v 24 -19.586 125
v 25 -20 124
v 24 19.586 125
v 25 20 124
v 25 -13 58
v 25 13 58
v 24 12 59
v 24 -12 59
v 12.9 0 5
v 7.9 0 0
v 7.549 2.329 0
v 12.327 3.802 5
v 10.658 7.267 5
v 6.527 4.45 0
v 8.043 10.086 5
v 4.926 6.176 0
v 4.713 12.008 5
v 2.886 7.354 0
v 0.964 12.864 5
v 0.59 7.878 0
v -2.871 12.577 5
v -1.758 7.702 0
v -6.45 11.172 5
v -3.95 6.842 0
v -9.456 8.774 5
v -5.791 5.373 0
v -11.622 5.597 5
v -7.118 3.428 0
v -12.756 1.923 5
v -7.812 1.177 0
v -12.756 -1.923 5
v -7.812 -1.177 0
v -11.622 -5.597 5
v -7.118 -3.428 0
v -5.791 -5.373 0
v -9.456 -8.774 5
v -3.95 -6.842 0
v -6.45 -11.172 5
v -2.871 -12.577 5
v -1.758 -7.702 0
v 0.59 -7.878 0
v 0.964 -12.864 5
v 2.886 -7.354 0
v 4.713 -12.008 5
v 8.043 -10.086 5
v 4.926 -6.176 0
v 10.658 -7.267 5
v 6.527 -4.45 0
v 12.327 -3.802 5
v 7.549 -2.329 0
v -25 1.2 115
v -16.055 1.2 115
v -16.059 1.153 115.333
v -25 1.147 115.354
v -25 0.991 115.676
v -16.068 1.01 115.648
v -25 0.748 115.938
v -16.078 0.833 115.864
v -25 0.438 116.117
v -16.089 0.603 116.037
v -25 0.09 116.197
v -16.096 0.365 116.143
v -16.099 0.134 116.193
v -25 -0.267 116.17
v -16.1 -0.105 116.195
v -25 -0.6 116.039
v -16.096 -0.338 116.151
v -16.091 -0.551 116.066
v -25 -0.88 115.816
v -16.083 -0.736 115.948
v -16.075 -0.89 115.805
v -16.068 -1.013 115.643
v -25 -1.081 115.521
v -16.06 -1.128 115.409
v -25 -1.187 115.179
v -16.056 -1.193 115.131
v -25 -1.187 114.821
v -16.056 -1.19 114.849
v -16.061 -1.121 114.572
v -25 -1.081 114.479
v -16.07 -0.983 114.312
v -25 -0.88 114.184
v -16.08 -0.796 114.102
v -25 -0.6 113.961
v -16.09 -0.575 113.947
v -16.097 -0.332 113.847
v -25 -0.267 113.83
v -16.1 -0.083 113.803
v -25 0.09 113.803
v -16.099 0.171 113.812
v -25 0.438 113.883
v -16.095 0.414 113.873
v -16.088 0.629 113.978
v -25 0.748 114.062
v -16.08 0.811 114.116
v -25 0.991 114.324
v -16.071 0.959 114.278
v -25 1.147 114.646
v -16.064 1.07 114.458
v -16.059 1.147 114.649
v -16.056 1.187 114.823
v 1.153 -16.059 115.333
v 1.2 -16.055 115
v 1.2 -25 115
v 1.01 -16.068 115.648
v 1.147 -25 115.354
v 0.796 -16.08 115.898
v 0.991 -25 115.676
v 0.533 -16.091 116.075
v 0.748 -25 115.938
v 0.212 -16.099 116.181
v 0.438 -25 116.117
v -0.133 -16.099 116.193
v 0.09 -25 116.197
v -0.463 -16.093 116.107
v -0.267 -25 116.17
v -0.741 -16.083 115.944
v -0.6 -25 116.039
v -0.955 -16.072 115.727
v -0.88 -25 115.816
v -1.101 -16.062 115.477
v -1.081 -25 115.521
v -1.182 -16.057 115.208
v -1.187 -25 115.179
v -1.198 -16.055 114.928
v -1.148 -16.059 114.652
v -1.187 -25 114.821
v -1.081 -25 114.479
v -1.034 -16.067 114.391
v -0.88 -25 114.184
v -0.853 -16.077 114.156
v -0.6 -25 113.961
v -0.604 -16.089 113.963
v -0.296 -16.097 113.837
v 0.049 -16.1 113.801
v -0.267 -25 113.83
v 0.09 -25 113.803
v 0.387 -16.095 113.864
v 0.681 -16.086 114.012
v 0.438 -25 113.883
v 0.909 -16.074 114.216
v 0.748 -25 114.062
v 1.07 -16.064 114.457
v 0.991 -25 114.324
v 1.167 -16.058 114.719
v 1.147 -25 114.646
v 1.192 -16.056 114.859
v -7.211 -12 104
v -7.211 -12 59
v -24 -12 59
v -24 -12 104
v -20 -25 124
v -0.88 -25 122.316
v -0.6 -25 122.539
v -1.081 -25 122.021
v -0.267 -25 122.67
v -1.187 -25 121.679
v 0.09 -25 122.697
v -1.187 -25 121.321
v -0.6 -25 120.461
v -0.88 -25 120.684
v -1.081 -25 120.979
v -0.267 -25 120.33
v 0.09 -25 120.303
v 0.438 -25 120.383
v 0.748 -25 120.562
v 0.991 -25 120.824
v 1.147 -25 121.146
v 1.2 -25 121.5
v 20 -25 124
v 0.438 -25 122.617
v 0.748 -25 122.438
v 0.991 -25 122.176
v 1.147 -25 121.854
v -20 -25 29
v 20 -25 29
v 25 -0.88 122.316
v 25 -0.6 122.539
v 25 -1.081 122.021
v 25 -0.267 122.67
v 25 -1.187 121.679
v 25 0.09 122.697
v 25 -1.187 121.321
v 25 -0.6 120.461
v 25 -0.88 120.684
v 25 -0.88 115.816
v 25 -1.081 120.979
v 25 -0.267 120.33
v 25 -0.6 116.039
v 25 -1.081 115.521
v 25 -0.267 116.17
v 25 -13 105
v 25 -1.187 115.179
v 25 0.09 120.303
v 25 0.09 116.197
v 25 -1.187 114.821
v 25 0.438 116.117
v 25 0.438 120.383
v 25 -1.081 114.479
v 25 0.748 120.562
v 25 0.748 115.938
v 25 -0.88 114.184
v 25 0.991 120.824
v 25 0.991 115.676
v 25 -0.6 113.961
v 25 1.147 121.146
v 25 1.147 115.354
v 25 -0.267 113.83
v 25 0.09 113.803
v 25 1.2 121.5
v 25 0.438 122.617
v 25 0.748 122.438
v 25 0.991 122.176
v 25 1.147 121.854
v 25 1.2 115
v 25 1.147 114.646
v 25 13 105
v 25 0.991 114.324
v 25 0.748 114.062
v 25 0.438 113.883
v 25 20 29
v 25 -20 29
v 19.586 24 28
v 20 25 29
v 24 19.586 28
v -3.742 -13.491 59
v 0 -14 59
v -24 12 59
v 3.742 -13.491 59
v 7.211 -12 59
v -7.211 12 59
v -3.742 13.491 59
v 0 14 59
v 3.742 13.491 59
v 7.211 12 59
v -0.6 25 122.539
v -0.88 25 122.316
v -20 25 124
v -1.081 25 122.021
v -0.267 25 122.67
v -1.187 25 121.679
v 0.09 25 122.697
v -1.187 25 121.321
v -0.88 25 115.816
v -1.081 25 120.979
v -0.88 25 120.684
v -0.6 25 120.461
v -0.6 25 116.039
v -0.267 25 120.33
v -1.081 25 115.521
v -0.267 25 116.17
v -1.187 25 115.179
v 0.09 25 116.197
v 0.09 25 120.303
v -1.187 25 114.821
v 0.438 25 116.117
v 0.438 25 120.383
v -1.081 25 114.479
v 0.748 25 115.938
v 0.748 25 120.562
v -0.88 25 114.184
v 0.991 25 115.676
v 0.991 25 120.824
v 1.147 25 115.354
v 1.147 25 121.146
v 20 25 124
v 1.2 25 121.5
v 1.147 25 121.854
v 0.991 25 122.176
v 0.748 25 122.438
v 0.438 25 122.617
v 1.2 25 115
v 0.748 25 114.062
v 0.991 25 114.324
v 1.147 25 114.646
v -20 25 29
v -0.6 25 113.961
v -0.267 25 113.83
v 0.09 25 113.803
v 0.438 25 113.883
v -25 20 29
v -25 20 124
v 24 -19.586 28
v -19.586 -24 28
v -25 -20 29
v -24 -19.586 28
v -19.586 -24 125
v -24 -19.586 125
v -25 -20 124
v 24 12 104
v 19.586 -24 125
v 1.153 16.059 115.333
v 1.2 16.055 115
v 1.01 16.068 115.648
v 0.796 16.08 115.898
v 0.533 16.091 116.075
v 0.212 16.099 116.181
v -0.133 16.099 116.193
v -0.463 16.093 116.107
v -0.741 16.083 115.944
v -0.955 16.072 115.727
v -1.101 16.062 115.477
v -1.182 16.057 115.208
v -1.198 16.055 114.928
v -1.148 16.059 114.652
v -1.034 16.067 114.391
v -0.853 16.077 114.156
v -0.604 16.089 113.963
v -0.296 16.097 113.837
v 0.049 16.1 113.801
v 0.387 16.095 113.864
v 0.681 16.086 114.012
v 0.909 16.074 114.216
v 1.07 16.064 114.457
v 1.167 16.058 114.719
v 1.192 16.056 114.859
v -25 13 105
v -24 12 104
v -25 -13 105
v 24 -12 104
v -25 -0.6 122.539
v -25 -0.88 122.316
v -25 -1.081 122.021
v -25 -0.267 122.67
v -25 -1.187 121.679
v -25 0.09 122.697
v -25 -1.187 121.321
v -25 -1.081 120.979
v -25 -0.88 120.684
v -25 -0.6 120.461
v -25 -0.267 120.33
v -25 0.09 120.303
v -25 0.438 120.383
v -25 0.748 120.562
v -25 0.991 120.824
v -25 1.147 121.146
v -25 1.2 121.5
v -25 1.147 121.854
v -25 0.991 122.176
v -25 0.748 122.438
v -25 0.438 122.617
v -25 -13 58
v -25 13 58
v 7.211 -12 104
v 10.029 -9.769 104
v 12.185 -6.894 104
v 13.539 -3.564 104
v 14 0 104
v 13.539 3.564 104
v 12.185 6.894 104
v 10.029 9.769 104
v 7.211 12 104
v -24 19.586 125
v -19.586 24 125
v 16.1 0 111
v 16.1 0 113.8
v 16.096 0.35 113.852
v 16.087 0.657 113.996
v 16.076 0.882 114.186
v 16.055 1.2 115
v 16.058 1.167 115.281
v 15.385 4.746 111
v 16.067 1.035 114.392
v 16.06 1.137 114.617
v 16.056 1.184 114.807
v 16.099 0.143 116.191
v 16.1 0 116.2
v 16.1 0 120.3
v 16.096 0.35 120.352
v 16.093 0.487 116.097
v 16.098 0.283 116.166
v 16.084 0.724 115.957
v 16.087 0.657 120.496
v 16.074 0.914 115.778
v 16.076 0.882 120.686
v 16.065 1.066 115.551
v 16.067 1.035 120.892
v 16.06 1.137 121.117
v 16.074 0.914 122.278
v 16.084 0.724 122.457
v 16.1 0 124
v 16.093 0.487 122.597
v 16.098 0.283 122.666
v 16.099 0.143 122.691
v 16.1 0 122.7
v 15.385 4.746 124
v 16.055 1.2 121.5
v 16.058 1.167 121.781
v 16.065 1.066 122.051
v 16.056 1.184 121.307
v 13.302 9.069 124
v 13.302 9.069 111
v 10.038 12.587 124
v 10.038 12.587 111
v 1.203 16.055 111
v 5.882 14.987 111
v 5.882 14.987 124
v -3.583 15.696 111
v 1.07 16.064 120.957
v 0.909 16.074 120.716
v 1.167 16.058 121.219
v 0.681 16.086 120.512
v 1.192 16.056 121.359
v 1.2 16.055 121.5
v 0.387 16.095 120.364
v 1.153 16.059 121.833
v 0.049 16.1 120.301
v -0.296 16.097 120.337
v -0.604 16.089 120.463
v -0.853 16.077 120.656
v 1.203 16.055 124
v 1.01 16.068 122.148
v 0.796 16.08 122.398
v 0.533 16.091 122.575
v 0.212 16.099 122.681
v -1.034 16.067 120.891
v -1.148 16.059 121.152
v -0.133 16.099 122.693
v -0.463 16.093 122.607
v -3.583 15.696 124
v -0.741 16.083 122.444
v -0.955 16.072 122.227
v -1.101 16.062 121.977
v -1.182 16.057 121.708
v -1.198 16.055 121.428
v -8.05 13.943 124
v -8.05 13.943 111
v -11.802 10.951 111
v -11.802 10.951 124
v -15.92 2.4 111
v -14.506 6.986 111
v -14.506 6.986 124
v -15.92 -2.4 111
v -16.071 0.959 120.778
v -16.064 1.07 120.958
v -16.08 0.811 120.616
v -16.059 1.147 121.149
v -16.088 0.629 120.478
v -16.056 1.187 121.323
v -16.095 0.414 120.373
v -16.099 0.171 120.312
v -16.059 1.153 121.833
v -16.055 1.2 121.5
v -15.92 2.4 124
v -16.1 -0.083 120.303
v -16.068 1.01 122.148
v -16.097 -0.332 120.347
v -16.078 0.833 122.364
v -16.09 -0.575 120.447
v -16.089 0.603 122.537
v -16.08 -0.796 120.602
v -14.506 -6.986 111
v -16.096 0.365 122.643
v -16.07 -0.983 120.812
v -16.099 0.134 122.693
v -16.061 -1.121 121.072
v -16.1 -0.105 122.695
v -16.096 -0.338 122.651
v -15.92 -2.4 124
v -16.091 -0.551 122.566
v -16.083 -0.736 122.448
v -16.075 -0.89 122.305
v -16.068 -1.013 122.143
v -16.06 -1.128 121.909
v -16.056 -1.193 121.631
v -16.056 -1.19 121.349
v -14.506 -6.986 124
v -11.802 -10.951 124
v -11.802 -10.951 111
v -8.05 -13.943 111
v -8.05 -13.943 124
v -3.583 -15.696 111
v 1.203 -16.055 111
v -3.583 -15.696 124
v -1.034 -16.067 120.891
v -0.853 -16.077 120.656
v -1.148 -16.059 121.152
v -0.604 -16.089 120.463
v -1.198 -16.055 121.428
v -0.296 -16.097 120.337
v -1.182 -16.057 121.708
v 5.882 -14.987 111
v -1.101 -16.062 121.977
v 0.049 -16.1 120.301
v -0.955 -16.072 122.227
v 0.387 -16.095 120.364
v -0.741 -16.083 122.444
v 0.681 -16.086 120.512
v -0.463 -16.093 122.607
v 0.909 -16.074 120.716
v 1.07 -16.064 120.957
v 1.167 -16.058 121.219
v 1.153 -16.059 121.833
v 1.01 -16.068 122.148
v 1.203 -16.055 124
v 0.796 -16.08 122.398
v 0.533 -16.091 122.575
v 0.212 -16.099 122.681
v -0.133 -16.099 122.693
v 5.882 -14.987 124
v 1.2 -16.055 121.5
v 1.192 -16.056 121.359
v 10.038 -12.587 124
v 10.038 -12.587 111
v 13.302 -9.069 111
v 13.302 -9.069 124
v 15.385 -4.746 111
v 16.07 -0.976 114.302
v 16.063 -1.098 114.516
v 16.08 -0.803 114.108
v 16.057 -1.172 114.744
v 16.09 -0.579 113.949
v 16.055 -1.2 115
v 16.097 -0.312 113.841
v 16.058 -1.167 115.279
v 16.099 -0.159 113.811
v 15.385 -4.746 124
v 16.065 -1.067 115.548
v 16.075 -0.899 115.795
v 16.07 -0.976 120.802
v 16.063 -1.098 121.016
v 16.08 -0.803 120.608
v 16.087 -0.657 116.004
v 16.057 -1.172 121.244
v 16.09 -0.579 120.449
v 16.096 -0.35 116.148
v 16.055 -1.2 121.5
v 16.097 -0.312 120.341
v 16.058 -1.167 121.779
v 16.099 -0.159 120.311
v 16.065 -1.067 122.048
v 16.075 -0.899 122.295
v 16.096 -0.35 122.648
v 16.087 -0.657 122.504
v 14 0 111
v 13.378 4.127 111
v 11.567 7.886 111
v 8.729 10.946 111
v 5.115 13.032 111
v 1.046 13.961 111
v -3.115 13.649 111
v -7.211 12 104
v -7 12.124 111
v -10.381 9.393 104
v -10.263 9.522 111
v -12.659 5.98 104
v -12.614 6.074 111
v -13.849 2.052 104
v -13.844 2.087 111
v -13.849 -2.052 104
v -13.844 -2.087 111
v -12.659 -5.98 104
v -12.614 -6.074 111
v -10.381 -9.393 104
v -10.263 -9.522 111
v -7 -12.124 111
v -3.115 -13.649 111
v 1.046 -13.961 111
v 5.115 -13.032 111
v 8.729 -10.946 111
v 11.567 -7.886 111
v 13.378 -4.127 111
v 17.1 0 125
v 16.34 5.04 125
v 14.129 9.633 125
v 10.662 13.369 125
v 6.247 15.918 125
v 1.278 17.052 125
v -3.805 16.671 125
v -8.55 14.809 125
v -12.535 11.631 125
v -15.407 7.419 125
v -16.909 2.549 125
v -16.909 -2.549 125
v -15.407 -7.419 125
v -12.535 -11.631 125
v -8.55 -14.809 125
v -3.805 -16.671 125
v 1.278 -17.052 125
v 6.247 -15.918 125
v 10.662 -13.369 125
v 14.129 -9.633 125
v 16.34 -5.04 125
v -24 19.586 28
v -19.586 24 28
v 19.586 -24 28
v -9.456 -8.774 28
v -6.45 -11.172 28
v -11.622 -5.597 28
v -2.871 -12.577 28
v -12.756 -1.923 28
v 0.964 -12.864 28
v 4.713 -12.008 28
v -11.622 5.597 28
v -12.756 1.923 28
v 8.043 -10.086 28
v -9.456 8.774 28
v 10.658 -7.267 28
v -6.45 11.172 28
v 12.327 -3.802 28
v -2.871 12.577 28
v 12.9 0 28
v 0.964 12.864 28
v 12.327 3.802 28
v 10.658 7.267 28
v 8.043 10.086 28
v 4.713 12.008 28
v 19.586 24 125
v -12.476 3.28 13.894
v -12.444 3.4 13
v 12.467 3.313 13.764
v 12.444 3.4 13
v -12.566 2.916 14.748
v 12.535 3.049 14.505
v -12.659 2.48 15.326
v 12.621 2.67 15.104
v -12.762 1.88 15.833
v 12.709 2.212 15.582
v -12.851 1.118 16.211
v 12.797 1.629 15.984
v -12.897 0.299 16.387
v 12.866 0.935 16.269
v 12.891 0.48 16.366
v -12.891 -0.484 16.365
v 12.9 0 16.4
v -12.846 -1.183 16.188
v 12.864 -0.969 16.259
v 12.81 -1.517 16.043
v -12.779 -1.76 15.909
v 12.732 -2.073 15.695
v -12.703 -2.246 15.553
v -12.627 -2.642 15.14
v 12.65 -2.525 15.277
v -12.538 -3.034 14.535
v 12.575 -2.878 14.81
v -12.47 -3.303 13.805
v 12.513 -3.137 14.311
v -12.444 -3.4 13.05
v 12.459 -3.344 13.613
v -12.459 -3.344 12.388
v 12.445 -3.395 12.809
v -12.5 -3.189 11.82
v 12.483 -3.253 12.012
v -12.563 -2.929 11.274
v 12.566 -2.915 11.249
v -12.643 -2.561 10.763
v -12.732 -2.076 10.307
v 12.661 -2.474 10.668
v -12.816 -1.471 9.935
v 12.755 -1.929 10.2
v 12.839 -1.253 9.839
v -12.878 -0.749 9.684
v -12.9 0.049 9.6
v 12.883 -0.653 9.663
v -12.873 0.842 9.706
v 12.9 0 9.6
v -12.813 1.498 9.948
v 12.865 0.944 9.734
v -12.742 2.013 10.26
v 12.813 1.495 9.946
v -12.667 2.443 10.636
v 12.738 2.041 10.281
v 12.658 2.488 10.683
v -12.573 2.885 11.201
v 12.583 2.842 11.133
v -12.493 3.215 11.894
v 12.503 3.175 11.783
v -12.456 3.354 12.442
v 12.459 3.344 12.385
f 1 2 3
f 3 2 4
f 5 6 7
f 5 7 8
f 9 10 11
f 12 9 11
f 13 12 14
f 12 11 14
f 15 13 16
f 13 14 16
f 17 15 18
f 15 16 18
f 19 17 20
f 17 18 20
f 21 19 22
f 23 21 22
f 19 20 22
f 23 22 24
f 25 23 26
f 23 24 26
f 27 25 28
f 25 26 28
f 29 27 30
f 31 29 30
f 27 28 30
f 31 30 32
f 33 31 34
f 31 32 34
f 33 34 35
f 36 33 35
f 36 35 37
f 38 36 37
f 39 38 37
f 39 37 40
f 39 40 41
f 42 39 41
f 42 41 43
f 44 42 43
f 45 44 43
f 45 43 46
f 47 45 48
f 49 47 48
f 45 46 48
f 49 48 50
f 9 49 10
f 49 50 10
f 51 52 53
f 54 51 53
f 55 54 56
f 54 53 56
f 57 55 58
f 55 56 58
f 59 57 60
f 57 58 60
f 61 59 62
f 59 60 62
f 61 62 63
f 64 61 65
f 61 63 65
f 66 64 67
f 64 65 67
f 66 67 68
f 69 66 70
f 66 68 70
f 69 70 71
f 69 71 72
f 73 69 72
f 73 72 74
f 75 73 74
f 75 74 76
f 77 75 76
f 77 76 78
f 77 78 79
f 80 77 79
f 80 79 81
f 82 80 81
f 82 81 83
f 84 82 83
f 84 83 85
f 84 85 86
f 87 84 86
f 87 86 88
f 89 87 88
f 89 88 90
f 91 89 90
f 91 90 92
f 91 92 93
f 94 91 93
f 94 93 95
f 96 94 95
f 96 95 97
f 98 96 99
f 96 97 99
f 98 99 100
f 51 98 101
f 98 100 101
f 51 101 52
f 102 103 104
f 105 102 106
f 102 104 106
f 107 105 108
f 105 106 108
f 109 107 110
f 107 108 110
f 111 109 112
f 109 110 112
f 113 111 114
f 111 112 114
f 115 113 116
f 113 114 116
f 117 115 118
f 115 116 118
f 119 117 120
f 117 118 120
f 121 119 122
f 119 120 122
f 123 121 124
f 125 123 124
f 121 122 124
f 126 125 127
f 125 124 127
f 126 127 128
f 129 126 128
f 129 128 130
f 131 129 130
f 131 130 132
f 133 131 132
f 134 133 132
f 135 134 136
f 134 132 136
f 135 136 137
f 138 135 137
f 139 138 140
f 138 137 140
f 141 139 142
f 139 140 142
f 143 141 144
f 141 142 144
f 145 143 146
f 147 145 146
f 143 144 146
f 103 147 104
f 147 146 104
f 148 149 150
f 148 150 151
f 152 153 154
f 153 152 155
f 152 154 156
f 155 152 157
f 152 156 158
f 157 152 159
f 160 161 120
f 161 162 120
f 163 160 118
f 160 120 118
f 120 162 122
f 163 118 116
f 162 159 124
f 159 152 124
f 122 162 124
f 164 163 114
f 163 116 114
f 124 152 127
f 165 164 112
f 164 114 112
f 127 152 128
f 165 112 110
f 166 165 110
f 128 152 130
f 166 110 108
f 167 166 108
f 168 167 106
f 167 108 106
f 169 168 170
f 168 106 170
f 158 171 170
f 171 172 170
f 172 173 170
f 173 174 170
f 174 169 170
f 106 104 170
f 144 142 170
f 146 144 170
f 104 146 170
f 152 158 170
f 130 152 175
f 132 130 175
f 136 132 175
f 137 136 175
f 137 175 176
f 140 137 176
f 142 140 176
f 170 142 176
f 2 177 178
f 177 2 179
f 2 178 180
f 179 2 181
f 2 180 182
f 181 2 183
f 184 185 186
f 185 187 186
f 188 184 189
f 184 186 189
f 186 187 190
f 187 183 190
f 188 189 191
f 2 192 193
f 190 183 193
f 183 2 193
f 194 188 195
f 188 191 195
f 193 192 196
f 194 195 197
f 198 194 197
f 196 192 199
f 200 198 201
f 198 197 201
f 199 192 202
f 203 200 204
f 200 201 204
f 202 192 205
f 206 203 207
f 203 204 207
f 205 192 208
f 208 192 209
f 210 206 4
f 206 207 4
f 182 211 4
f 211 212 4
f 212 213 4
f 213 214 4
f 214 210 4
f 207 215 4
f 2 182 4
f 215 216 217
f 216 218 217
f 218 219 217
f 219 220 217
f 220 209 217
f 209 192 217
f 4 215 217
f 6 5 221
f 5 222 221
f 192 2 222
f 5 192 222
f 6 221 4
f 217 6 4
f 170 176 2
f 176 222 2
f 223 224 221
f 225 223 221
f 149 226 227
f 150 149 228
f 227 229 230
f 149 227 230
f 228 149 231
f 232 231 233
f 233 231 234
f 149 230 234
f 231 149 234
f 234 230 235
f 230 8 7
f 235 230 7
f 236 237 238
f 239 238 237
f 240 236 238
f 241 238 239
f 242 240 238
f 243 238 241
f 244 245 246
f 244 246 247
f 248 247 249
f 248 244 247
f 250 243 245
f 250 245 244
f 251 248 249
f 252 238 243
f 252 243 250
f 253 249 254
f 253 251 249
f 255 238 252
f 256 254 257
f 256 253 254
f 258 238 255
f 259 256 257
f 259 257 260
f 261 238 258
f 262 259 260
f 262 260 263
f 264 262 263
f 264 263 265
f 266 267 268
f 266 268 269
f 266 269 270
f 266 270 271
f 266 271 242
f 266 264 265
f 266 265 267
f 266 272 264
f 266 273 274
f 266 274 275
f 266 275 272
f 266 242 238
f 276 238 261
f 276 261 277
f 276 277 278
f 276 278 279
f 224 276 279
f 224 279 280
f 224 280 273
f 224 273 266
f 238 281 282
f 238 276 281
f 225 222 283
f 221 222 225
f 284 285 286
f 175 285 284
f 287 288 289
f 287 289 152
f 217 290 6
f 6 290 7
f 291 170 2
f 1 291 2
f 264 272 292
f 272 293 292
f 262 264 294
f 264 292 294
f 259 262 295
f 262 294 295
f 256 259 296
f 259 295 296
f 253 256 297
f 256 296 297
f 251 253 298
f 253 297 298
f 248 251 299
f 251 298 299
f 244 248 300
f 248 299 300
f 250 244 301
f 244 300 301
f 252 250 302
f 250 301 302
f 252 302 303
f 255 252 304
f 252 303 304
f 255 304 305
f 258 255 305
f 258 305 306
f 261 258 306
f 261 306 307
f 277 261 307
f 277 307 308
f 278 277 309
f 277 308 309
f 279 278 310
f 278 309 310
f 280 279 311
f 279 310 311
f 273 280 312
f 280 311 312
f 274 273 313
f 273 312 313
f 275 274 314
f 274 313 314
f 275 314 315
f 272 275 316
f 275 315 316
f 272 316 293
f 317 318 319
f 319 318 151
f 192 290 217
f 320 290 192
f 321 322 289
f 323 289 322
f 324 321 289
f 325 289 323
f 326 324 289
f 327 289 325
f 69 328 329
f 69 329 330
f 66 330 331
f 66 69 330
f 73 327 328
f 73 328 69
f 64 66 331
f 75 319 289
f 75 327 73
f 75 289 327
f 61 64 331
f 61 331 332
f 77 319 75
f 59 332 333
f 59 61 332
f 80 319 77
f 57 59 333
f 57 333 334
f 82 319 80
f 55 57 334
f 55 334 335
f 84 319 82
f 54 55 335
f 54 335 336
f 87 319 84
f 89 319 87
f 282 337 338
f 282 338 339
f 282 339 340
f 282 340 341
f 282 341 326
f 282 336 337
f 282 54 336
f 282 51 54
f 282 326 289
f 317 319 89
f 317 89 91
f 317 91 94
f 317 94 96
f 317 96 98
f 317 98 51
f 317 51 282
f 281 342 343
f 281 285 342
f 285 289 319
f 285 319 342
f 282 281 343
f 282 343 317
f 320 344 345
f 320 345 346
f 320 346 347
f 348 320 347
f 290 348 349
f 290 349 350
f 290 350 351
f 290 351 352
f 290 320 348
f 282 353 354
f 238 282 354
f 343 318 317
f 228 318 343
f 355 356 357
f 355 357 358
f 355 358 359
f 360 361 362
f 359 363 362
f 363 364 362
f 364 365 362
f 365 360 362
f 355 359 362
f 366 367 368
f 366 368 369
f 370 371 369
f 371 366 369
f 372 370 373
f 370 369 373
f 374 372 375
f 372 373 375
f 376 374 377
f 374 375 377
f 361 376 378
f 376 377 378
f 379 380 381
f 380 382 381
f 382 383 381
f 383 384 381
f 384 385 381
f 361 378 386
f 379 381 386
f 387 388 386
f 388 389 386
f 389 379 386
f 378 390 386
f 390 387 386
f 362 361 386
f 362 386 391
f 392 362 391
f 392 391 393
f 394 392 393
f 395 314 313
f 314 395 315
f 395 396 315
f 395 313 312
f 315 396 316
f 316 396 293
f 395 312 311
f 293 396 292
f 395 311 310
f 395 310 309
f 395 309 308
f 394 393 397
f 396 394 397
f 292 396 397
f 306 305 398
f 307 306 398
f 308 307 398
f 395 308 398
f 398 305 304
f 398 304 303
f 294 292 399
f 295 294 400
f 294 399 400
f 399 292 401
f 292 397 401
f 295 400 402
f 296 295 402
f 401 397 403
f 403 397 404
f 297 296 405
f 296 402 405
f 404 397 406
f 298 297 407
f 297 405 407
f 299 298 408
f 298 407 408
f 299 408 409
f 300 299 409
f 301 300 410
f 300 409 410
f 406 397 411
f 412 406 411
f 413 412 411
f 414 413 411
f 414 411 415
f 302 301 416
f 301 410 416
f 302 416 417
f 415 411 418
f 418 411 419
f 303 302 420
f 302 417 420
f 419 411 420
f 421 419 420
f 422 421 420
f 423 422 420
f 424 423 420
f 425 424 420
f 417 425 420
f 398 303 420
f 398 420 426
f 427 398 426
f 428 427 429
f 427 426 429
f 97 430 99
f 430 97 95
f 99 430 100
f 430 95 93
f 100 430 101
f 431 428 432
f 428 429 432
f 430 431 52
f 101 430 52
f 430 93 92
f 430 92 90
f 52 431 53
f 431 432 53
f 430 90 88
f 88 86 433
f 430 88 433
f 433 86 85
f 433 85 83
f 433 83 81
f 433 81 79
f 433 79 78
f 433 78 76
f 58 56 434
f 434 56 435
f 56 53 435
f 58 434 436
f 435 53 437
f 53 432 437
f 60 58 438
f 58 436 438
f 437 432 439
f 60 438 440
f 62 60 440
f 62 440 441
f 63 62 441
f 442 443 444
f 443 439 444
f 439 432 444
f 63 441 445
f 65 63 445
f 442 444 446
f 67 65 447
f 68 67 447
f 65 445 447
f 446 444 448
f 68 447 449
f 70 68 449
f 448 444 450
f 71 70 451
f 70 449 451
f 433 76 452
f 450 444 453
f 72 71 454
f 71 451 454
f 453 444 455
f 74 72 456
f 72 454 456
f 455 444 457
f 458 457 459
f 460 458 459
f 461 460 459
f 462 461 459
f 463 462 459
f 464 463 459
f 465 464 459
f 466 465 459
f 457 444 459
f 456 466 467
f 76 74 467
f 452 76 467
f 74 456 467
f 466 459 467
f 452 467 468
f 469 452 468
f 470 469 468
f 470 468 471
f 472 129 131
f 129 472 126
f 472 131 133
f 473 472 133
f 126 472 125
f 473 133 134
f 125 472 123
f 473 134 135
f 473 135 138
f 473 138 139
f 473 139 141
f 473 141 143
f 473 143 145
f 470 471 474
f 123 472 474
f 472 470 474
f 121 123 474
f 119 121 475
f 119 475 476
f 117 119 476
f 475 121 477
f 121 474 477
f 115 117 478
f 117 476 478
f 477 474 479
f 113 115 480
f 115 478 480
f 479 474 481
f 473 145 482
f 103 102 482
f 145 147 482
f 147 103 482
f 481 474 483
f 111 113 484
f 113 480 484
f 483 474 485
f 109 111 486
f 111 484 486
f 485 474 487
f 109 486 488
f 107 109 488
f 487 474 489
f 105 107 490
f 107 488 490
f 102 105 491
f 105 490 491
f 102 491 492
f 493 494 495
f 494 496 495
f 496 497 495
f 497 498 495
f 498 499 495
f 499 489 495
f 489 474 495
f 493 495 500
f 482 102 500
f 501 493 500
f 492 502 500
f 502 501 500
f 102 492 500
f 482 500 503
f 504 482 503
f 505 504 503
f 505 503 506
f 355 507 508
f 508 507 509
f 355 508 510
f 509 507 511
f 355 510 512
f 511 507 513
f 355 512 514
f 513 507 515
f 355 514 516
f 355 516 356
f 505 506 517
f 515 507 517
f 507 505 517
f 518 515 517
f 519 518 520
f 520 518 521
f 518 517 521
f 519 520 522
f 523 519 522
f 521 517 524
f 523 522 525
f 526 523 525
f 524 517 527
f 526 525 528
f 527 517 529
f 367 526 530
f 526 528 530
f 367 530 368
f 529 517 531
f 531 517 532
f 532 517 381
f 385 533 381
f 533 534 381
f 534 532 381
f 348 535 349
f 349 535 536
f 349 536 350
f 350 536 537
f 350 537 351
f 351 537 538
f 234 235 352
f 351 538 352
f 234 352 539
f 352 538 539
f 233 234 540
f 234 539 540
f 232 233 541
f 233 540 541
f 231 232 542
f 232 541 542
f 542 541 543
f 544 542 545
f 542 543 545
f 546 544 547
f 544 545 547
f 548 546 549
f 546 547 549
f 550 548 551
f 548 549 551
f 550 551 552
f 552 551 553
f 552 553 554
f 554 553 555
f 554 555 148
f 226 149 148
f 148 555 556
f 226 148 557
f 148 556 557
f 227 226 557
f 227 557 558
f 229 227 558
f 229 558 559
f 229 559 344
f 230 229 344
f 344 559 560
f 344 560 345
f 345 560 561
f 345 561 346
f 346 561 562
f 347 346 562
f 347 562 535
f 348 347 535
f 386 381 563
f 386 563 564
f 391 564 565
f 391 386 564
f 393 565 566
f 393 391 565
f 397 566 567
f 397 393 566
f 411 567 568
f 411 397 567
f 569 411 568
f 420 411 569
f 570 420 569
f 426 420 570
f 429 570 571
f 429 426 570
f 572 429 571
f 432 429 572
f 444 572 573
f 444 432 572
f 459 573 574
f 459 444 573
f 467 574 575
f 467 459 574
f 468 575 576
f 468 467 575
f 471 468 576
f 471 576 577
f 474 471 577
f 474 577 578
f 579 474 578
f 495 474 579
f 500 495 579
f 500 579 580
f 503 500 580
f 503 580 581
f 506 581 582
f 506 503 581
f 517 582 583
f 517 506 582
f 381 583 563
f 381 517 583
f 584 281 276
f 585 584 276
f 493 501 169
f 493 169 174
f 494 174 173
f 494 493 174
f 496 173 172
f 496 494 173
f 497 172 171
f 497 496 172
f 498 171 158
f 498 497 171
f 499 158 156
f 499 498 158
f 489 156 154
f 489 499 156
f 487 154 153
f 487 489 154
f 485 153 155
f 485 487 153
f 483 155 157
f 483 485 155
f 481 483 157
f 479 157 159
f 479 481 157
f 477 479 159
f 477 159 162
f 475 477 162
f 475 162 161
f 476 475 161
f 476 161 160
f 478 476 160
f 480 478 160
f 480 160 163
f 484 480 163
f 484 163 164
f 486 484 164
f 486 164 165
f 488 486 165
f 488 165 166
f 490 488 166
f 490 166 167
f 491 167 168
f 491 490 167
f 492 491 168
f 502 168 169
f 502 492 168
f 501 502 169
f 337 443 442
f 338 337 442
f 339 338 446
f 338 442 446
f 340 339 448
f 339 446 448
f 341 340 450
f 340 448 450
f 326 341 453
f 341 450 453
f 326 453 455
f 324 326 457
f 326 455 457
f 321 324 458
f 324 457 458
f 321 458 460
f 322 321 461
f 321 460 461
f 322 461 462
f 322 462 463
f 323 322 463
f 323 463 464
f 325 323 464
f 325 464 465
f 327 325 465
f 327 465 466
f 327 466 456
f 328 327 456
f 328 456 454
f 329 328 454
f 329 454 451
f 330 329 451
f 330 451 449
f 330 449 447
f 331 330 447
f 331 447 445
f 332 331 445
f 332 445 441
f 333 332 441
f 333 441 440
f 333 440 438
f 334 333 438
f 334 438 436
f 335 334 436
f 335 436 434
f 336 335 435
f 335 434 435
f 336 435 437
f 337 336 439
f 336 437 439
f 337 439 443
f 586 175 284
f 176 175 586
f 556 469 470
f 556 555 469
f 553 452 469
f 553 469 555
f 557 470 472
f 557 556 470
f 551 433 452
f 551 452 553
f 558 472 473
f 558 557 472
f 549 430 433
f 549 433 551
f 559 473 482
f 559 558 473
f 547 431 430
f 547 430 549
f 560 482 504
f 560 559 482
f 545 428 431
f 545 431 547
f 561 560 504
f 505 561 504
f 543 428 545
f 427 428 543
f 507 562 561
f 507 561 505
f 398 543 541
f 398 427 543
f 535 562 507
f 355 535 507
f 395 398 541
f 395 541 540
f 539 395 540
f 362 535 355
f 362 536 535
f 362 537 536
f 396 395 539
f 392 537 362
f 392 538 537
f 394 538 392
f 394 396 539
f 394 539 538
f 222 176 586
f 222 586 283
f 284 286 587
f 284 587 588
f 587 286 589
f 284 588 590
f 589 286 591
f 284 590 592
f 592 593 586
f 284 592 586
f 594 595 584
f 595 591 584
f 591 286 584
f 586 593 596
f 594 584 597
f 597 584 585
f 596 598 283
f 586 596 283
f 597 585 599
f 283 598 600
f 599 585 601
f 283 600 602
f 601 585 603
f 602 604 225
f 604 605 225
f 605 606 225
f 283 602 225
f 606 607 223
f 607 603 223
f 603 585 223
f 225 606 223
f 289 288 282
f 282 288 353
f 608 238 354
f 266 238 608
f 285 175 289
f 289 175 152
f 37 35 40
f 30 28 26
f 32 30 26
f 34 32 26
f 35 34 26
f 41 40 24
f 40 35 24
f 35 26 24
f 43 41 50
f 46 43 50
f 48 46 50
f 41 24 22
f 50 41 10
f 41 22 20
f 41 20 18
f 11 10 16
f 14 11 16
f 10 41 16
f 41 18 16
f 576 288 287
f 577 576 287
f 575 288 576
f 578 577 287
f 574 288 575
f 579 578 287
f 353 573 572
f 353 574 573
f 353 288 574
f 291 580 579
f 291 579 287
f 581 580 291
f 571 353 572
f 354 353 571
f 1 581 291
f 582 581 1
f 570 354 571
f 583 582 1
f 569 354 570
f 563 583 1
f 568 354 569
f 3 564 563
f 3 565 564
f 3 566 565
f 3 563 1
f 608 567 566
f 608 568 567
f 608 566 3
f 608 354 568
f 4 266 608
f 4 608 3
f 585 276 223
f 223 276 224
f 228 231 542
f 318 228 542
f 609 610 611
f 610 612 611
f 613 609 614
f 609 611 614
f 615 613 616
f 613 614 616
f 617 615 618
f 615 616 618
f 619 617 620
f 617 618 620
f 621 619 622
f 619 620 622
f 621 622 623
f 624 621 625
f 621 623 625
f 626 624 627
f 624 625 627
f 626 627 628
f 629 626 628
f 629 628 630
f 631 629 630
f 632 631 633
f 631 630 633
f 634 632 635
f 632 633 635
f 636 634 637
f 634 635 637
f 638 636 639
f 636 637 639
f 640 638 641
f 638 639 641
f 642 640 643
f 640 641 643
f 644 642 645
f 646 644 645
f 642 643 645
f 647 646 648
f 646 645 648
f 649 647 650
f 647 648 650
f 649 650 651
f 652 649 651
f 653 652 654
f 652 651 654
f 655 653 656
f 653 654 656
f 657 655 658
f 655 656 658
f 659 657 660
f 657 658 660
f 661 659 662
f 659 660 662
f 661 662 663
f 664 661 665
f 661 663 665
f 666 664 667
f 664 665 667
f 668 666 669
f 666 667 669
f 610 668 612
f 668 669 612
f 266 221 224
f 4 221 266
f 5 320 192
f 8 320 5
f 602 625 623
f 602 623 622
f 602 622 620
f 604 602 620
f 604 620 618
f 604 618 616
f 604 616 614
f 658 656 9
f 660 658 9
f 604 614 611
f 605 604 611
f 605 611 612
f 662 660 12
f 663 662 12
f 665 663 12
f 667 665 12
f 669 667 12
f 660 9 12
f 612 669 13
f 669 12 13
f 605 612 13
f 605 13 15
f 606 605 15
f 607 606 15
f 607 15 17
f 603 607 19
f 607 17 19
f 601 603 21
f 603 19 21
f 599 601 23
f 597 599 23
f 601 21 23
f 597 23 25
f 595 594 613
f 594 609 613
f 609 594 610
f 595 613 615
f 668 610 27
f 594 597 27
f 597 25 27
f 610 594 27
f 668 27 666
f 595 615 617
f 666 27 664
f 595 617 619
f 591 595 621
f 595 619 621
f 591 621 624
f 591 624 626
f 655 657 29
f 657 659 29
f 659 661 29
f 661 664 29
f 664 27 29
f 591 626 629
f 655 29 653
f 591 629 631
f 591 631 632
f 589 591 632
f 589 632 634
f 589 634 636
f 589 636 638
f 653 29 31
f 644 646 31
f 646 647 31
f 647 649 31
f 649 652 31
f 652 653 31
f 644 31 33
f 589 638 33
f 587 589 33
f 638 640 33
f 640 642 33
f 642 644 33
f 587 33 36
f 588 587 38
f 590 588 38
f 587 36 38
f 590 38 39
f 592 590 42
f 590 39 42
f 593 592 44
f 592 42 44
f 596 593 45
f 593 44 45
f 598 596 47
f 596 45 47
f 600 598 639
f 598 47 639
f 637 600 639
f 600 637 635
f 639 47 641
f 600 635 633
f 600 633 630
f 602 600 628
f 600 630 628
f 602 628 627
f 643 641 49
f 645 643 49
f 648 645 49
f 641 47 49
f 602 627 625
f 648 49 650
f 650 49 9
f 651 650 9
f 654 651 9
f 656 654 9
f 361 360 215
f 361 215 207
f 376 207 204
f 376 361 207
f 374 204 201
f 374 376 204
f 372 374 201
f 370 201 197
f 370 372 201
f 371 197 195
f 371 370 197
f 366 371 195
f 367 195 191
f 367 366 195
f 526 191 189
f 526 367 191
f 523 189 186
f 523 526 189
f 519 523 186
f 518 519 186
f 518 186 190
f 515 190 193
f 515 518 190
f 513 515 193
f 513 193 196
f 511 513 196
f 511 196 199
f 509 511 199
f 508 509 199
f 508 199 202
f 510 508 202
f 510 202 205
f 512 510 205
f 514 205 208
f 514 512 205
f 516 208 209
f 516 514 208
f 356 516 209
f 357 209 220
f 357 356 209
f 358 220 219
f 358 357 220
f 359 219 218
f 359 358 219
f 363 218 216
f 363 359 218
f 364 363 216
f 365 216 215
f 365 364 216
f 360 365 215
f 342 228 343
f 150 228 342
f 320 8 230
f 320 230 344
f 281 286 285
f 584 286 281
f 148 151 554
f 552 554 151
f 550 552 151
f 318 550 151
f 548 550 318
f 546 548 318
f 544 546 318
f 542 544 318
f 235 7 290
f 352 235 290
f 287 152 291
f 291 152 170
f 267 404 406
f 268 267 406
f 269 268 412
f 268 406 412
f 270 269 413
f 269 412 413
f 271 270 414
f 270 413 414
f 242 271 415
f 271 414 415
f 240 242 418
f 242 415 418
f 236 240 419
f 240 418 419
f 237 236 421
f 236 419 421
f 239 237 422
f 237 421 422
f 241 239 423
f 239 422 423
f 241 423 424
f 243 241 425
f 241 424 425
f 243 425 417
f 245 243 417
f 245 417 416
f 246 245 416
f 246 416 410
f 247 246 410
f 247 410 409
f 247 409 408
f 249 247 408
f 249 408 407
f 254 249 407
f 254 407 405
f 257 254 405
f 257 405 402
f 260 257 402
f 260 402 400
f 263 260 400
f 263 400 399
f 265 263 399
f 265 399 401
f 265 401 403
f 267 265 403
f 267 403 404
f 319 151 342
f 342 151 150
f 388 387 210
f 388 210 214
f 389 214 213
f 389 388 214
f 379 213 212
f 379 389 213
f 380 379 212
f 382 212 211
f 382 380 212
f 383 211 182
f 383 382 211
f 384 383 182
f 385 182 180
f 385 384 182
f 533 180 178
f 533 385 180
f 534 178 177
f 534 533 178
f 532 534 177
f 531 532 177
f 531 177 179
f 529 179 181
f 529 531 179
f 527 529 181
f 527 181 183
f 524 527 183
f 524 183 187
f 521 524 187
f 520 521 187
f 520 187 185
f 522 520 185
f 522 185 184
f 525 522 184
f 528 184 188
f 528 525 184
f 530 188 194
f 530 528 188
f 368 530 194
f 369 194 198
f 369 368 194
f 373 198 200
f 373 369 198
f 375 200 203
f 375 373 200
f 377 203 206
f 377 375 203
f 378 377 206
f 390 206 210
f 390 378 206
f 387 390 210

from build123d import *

# Parameters (mm, degrees)
F0_R      = 12.9
F1_DEPTH  = 28
F2_W      = 50
F2_H      = 50
F3_DEPTH  = 97
F4_R      = 14
F5_DEPTH  = 66
F6_R      = 16.1
F7_DEPTH  = 14
F8_R      = 3.4
F9_DEPTH  = 15
F10_R     = 1.2
F11_DEPTH = 51.4
F12_R     = 1.2
F12_W     = 24
F12_H     = 45
F13_DEPTH = 37.8
F14_SIZE  = 5
F15_SIZE  = 1


with BuildPart() as f1:
    # F0 (on Top) → F1 (new body)
    with BuildSketch(Plane.XY):
        Circle(F0_R)
    extrude(amount=F1_DEPTH)

    # F2 (on face) → F3 (join)
    with BuildSketch(Plane.XY.offset(28)):
        Rectangle(F2_W, F2_H)
    extrude(amount=F3_DEPTH)

    # F4 (on face) → F5 (cut)
    with BuildSketch(Plane.XY.offset(125)):
        Circle(F4_R)
    extrude(amount=-F5_DEPTH, mode=Mode.SUBTRACT)

    # F6 (on face) → F7 (cut)
    with BuildSketch(Plane.XY.offset(125)):
        Circle(F6_R)
    extrude(amount=-F7_DEPTH, mode=Mode.SUBTRACT)

    # F8 (on Right) → F9 (cut, symmetric)
    with BuildSketch(Plane.YZ):
        with Locations((0, 13)):
            Circle(F8_R)
    extrude(amount=F9_DEPTH, both=True, mode=Mode.SUBTRACT)

    # F10 (on Front) → F11 (cut, symmetric)
    with BuildSketch(Plane.XZ):
        with Locations((0, 121.5)):
            Circle(F10_R)
        with Locations((0, 115)):
            Circle(F10_R)
    extrude(amount=F11_DEPTH, both=True, mode=Mode.SUBTRACT)

    # F12 (on Right) → F13 (cut, symmetric)
    with BuildSketch(Plane.YZ):
        with Locations((0, 121.5)):
            Circle(F12_R)
        with Locations((0, 115)):
            Circle(F12_R)
        with Locations((0, 81.5)):
            Rectangle(F12_W, F12_H)
    extrude(amount=F13_DEPTH, both=True, mode=Mode.SUBTRACT)

    # F14
    f14_edges = [f1.edges().sort_by_distance(p)[0] for p in [
        (-12.9, 0, 0),
        (-25, 25, 76.5),
        (-25, -25, 76.5),
        (25, -25, 76.5),
        (25, 25, 76.5),
    ]]
    chamfer(f14_edges, length=F14_SIZE)

    # F15
    f15_edges = [f1.edges().sort_by_distance(p)[0] for p in [
        (-16.1, 0, 125),
        (0, -25, 125),
        (-22.5, -22.5, 125),
        (22.5, -22.5, 125),
        (-25, 0, 125),
        (25, 0, 125),
        (-22.5, 22.5, 125),
        (22.5, 22.5, 125),
        (0, 25, 125),
        (-25, 0, 28),
        (0, 25, 28),
        (-22.5, 22.5, 28),
        (0, -25, 28),
        (-22.5, -22.5, 28),
        (22.5, -22.5, 28),
        (25, 0, 28),
        (22.5, 22.5, 28),
        (-25, 0, 59),
        (-25, 12, 81.5),
        (-25, 0, 104),
        (-25, -12, 81.5),
        (25, 0, 59),
        (25, -12, 81.5),
        (25, 12, 81.5),
        (25, 0, 104),
    ]]
    chamfer(f15_edges, length=F15_SIZE)


solid = f1.part
